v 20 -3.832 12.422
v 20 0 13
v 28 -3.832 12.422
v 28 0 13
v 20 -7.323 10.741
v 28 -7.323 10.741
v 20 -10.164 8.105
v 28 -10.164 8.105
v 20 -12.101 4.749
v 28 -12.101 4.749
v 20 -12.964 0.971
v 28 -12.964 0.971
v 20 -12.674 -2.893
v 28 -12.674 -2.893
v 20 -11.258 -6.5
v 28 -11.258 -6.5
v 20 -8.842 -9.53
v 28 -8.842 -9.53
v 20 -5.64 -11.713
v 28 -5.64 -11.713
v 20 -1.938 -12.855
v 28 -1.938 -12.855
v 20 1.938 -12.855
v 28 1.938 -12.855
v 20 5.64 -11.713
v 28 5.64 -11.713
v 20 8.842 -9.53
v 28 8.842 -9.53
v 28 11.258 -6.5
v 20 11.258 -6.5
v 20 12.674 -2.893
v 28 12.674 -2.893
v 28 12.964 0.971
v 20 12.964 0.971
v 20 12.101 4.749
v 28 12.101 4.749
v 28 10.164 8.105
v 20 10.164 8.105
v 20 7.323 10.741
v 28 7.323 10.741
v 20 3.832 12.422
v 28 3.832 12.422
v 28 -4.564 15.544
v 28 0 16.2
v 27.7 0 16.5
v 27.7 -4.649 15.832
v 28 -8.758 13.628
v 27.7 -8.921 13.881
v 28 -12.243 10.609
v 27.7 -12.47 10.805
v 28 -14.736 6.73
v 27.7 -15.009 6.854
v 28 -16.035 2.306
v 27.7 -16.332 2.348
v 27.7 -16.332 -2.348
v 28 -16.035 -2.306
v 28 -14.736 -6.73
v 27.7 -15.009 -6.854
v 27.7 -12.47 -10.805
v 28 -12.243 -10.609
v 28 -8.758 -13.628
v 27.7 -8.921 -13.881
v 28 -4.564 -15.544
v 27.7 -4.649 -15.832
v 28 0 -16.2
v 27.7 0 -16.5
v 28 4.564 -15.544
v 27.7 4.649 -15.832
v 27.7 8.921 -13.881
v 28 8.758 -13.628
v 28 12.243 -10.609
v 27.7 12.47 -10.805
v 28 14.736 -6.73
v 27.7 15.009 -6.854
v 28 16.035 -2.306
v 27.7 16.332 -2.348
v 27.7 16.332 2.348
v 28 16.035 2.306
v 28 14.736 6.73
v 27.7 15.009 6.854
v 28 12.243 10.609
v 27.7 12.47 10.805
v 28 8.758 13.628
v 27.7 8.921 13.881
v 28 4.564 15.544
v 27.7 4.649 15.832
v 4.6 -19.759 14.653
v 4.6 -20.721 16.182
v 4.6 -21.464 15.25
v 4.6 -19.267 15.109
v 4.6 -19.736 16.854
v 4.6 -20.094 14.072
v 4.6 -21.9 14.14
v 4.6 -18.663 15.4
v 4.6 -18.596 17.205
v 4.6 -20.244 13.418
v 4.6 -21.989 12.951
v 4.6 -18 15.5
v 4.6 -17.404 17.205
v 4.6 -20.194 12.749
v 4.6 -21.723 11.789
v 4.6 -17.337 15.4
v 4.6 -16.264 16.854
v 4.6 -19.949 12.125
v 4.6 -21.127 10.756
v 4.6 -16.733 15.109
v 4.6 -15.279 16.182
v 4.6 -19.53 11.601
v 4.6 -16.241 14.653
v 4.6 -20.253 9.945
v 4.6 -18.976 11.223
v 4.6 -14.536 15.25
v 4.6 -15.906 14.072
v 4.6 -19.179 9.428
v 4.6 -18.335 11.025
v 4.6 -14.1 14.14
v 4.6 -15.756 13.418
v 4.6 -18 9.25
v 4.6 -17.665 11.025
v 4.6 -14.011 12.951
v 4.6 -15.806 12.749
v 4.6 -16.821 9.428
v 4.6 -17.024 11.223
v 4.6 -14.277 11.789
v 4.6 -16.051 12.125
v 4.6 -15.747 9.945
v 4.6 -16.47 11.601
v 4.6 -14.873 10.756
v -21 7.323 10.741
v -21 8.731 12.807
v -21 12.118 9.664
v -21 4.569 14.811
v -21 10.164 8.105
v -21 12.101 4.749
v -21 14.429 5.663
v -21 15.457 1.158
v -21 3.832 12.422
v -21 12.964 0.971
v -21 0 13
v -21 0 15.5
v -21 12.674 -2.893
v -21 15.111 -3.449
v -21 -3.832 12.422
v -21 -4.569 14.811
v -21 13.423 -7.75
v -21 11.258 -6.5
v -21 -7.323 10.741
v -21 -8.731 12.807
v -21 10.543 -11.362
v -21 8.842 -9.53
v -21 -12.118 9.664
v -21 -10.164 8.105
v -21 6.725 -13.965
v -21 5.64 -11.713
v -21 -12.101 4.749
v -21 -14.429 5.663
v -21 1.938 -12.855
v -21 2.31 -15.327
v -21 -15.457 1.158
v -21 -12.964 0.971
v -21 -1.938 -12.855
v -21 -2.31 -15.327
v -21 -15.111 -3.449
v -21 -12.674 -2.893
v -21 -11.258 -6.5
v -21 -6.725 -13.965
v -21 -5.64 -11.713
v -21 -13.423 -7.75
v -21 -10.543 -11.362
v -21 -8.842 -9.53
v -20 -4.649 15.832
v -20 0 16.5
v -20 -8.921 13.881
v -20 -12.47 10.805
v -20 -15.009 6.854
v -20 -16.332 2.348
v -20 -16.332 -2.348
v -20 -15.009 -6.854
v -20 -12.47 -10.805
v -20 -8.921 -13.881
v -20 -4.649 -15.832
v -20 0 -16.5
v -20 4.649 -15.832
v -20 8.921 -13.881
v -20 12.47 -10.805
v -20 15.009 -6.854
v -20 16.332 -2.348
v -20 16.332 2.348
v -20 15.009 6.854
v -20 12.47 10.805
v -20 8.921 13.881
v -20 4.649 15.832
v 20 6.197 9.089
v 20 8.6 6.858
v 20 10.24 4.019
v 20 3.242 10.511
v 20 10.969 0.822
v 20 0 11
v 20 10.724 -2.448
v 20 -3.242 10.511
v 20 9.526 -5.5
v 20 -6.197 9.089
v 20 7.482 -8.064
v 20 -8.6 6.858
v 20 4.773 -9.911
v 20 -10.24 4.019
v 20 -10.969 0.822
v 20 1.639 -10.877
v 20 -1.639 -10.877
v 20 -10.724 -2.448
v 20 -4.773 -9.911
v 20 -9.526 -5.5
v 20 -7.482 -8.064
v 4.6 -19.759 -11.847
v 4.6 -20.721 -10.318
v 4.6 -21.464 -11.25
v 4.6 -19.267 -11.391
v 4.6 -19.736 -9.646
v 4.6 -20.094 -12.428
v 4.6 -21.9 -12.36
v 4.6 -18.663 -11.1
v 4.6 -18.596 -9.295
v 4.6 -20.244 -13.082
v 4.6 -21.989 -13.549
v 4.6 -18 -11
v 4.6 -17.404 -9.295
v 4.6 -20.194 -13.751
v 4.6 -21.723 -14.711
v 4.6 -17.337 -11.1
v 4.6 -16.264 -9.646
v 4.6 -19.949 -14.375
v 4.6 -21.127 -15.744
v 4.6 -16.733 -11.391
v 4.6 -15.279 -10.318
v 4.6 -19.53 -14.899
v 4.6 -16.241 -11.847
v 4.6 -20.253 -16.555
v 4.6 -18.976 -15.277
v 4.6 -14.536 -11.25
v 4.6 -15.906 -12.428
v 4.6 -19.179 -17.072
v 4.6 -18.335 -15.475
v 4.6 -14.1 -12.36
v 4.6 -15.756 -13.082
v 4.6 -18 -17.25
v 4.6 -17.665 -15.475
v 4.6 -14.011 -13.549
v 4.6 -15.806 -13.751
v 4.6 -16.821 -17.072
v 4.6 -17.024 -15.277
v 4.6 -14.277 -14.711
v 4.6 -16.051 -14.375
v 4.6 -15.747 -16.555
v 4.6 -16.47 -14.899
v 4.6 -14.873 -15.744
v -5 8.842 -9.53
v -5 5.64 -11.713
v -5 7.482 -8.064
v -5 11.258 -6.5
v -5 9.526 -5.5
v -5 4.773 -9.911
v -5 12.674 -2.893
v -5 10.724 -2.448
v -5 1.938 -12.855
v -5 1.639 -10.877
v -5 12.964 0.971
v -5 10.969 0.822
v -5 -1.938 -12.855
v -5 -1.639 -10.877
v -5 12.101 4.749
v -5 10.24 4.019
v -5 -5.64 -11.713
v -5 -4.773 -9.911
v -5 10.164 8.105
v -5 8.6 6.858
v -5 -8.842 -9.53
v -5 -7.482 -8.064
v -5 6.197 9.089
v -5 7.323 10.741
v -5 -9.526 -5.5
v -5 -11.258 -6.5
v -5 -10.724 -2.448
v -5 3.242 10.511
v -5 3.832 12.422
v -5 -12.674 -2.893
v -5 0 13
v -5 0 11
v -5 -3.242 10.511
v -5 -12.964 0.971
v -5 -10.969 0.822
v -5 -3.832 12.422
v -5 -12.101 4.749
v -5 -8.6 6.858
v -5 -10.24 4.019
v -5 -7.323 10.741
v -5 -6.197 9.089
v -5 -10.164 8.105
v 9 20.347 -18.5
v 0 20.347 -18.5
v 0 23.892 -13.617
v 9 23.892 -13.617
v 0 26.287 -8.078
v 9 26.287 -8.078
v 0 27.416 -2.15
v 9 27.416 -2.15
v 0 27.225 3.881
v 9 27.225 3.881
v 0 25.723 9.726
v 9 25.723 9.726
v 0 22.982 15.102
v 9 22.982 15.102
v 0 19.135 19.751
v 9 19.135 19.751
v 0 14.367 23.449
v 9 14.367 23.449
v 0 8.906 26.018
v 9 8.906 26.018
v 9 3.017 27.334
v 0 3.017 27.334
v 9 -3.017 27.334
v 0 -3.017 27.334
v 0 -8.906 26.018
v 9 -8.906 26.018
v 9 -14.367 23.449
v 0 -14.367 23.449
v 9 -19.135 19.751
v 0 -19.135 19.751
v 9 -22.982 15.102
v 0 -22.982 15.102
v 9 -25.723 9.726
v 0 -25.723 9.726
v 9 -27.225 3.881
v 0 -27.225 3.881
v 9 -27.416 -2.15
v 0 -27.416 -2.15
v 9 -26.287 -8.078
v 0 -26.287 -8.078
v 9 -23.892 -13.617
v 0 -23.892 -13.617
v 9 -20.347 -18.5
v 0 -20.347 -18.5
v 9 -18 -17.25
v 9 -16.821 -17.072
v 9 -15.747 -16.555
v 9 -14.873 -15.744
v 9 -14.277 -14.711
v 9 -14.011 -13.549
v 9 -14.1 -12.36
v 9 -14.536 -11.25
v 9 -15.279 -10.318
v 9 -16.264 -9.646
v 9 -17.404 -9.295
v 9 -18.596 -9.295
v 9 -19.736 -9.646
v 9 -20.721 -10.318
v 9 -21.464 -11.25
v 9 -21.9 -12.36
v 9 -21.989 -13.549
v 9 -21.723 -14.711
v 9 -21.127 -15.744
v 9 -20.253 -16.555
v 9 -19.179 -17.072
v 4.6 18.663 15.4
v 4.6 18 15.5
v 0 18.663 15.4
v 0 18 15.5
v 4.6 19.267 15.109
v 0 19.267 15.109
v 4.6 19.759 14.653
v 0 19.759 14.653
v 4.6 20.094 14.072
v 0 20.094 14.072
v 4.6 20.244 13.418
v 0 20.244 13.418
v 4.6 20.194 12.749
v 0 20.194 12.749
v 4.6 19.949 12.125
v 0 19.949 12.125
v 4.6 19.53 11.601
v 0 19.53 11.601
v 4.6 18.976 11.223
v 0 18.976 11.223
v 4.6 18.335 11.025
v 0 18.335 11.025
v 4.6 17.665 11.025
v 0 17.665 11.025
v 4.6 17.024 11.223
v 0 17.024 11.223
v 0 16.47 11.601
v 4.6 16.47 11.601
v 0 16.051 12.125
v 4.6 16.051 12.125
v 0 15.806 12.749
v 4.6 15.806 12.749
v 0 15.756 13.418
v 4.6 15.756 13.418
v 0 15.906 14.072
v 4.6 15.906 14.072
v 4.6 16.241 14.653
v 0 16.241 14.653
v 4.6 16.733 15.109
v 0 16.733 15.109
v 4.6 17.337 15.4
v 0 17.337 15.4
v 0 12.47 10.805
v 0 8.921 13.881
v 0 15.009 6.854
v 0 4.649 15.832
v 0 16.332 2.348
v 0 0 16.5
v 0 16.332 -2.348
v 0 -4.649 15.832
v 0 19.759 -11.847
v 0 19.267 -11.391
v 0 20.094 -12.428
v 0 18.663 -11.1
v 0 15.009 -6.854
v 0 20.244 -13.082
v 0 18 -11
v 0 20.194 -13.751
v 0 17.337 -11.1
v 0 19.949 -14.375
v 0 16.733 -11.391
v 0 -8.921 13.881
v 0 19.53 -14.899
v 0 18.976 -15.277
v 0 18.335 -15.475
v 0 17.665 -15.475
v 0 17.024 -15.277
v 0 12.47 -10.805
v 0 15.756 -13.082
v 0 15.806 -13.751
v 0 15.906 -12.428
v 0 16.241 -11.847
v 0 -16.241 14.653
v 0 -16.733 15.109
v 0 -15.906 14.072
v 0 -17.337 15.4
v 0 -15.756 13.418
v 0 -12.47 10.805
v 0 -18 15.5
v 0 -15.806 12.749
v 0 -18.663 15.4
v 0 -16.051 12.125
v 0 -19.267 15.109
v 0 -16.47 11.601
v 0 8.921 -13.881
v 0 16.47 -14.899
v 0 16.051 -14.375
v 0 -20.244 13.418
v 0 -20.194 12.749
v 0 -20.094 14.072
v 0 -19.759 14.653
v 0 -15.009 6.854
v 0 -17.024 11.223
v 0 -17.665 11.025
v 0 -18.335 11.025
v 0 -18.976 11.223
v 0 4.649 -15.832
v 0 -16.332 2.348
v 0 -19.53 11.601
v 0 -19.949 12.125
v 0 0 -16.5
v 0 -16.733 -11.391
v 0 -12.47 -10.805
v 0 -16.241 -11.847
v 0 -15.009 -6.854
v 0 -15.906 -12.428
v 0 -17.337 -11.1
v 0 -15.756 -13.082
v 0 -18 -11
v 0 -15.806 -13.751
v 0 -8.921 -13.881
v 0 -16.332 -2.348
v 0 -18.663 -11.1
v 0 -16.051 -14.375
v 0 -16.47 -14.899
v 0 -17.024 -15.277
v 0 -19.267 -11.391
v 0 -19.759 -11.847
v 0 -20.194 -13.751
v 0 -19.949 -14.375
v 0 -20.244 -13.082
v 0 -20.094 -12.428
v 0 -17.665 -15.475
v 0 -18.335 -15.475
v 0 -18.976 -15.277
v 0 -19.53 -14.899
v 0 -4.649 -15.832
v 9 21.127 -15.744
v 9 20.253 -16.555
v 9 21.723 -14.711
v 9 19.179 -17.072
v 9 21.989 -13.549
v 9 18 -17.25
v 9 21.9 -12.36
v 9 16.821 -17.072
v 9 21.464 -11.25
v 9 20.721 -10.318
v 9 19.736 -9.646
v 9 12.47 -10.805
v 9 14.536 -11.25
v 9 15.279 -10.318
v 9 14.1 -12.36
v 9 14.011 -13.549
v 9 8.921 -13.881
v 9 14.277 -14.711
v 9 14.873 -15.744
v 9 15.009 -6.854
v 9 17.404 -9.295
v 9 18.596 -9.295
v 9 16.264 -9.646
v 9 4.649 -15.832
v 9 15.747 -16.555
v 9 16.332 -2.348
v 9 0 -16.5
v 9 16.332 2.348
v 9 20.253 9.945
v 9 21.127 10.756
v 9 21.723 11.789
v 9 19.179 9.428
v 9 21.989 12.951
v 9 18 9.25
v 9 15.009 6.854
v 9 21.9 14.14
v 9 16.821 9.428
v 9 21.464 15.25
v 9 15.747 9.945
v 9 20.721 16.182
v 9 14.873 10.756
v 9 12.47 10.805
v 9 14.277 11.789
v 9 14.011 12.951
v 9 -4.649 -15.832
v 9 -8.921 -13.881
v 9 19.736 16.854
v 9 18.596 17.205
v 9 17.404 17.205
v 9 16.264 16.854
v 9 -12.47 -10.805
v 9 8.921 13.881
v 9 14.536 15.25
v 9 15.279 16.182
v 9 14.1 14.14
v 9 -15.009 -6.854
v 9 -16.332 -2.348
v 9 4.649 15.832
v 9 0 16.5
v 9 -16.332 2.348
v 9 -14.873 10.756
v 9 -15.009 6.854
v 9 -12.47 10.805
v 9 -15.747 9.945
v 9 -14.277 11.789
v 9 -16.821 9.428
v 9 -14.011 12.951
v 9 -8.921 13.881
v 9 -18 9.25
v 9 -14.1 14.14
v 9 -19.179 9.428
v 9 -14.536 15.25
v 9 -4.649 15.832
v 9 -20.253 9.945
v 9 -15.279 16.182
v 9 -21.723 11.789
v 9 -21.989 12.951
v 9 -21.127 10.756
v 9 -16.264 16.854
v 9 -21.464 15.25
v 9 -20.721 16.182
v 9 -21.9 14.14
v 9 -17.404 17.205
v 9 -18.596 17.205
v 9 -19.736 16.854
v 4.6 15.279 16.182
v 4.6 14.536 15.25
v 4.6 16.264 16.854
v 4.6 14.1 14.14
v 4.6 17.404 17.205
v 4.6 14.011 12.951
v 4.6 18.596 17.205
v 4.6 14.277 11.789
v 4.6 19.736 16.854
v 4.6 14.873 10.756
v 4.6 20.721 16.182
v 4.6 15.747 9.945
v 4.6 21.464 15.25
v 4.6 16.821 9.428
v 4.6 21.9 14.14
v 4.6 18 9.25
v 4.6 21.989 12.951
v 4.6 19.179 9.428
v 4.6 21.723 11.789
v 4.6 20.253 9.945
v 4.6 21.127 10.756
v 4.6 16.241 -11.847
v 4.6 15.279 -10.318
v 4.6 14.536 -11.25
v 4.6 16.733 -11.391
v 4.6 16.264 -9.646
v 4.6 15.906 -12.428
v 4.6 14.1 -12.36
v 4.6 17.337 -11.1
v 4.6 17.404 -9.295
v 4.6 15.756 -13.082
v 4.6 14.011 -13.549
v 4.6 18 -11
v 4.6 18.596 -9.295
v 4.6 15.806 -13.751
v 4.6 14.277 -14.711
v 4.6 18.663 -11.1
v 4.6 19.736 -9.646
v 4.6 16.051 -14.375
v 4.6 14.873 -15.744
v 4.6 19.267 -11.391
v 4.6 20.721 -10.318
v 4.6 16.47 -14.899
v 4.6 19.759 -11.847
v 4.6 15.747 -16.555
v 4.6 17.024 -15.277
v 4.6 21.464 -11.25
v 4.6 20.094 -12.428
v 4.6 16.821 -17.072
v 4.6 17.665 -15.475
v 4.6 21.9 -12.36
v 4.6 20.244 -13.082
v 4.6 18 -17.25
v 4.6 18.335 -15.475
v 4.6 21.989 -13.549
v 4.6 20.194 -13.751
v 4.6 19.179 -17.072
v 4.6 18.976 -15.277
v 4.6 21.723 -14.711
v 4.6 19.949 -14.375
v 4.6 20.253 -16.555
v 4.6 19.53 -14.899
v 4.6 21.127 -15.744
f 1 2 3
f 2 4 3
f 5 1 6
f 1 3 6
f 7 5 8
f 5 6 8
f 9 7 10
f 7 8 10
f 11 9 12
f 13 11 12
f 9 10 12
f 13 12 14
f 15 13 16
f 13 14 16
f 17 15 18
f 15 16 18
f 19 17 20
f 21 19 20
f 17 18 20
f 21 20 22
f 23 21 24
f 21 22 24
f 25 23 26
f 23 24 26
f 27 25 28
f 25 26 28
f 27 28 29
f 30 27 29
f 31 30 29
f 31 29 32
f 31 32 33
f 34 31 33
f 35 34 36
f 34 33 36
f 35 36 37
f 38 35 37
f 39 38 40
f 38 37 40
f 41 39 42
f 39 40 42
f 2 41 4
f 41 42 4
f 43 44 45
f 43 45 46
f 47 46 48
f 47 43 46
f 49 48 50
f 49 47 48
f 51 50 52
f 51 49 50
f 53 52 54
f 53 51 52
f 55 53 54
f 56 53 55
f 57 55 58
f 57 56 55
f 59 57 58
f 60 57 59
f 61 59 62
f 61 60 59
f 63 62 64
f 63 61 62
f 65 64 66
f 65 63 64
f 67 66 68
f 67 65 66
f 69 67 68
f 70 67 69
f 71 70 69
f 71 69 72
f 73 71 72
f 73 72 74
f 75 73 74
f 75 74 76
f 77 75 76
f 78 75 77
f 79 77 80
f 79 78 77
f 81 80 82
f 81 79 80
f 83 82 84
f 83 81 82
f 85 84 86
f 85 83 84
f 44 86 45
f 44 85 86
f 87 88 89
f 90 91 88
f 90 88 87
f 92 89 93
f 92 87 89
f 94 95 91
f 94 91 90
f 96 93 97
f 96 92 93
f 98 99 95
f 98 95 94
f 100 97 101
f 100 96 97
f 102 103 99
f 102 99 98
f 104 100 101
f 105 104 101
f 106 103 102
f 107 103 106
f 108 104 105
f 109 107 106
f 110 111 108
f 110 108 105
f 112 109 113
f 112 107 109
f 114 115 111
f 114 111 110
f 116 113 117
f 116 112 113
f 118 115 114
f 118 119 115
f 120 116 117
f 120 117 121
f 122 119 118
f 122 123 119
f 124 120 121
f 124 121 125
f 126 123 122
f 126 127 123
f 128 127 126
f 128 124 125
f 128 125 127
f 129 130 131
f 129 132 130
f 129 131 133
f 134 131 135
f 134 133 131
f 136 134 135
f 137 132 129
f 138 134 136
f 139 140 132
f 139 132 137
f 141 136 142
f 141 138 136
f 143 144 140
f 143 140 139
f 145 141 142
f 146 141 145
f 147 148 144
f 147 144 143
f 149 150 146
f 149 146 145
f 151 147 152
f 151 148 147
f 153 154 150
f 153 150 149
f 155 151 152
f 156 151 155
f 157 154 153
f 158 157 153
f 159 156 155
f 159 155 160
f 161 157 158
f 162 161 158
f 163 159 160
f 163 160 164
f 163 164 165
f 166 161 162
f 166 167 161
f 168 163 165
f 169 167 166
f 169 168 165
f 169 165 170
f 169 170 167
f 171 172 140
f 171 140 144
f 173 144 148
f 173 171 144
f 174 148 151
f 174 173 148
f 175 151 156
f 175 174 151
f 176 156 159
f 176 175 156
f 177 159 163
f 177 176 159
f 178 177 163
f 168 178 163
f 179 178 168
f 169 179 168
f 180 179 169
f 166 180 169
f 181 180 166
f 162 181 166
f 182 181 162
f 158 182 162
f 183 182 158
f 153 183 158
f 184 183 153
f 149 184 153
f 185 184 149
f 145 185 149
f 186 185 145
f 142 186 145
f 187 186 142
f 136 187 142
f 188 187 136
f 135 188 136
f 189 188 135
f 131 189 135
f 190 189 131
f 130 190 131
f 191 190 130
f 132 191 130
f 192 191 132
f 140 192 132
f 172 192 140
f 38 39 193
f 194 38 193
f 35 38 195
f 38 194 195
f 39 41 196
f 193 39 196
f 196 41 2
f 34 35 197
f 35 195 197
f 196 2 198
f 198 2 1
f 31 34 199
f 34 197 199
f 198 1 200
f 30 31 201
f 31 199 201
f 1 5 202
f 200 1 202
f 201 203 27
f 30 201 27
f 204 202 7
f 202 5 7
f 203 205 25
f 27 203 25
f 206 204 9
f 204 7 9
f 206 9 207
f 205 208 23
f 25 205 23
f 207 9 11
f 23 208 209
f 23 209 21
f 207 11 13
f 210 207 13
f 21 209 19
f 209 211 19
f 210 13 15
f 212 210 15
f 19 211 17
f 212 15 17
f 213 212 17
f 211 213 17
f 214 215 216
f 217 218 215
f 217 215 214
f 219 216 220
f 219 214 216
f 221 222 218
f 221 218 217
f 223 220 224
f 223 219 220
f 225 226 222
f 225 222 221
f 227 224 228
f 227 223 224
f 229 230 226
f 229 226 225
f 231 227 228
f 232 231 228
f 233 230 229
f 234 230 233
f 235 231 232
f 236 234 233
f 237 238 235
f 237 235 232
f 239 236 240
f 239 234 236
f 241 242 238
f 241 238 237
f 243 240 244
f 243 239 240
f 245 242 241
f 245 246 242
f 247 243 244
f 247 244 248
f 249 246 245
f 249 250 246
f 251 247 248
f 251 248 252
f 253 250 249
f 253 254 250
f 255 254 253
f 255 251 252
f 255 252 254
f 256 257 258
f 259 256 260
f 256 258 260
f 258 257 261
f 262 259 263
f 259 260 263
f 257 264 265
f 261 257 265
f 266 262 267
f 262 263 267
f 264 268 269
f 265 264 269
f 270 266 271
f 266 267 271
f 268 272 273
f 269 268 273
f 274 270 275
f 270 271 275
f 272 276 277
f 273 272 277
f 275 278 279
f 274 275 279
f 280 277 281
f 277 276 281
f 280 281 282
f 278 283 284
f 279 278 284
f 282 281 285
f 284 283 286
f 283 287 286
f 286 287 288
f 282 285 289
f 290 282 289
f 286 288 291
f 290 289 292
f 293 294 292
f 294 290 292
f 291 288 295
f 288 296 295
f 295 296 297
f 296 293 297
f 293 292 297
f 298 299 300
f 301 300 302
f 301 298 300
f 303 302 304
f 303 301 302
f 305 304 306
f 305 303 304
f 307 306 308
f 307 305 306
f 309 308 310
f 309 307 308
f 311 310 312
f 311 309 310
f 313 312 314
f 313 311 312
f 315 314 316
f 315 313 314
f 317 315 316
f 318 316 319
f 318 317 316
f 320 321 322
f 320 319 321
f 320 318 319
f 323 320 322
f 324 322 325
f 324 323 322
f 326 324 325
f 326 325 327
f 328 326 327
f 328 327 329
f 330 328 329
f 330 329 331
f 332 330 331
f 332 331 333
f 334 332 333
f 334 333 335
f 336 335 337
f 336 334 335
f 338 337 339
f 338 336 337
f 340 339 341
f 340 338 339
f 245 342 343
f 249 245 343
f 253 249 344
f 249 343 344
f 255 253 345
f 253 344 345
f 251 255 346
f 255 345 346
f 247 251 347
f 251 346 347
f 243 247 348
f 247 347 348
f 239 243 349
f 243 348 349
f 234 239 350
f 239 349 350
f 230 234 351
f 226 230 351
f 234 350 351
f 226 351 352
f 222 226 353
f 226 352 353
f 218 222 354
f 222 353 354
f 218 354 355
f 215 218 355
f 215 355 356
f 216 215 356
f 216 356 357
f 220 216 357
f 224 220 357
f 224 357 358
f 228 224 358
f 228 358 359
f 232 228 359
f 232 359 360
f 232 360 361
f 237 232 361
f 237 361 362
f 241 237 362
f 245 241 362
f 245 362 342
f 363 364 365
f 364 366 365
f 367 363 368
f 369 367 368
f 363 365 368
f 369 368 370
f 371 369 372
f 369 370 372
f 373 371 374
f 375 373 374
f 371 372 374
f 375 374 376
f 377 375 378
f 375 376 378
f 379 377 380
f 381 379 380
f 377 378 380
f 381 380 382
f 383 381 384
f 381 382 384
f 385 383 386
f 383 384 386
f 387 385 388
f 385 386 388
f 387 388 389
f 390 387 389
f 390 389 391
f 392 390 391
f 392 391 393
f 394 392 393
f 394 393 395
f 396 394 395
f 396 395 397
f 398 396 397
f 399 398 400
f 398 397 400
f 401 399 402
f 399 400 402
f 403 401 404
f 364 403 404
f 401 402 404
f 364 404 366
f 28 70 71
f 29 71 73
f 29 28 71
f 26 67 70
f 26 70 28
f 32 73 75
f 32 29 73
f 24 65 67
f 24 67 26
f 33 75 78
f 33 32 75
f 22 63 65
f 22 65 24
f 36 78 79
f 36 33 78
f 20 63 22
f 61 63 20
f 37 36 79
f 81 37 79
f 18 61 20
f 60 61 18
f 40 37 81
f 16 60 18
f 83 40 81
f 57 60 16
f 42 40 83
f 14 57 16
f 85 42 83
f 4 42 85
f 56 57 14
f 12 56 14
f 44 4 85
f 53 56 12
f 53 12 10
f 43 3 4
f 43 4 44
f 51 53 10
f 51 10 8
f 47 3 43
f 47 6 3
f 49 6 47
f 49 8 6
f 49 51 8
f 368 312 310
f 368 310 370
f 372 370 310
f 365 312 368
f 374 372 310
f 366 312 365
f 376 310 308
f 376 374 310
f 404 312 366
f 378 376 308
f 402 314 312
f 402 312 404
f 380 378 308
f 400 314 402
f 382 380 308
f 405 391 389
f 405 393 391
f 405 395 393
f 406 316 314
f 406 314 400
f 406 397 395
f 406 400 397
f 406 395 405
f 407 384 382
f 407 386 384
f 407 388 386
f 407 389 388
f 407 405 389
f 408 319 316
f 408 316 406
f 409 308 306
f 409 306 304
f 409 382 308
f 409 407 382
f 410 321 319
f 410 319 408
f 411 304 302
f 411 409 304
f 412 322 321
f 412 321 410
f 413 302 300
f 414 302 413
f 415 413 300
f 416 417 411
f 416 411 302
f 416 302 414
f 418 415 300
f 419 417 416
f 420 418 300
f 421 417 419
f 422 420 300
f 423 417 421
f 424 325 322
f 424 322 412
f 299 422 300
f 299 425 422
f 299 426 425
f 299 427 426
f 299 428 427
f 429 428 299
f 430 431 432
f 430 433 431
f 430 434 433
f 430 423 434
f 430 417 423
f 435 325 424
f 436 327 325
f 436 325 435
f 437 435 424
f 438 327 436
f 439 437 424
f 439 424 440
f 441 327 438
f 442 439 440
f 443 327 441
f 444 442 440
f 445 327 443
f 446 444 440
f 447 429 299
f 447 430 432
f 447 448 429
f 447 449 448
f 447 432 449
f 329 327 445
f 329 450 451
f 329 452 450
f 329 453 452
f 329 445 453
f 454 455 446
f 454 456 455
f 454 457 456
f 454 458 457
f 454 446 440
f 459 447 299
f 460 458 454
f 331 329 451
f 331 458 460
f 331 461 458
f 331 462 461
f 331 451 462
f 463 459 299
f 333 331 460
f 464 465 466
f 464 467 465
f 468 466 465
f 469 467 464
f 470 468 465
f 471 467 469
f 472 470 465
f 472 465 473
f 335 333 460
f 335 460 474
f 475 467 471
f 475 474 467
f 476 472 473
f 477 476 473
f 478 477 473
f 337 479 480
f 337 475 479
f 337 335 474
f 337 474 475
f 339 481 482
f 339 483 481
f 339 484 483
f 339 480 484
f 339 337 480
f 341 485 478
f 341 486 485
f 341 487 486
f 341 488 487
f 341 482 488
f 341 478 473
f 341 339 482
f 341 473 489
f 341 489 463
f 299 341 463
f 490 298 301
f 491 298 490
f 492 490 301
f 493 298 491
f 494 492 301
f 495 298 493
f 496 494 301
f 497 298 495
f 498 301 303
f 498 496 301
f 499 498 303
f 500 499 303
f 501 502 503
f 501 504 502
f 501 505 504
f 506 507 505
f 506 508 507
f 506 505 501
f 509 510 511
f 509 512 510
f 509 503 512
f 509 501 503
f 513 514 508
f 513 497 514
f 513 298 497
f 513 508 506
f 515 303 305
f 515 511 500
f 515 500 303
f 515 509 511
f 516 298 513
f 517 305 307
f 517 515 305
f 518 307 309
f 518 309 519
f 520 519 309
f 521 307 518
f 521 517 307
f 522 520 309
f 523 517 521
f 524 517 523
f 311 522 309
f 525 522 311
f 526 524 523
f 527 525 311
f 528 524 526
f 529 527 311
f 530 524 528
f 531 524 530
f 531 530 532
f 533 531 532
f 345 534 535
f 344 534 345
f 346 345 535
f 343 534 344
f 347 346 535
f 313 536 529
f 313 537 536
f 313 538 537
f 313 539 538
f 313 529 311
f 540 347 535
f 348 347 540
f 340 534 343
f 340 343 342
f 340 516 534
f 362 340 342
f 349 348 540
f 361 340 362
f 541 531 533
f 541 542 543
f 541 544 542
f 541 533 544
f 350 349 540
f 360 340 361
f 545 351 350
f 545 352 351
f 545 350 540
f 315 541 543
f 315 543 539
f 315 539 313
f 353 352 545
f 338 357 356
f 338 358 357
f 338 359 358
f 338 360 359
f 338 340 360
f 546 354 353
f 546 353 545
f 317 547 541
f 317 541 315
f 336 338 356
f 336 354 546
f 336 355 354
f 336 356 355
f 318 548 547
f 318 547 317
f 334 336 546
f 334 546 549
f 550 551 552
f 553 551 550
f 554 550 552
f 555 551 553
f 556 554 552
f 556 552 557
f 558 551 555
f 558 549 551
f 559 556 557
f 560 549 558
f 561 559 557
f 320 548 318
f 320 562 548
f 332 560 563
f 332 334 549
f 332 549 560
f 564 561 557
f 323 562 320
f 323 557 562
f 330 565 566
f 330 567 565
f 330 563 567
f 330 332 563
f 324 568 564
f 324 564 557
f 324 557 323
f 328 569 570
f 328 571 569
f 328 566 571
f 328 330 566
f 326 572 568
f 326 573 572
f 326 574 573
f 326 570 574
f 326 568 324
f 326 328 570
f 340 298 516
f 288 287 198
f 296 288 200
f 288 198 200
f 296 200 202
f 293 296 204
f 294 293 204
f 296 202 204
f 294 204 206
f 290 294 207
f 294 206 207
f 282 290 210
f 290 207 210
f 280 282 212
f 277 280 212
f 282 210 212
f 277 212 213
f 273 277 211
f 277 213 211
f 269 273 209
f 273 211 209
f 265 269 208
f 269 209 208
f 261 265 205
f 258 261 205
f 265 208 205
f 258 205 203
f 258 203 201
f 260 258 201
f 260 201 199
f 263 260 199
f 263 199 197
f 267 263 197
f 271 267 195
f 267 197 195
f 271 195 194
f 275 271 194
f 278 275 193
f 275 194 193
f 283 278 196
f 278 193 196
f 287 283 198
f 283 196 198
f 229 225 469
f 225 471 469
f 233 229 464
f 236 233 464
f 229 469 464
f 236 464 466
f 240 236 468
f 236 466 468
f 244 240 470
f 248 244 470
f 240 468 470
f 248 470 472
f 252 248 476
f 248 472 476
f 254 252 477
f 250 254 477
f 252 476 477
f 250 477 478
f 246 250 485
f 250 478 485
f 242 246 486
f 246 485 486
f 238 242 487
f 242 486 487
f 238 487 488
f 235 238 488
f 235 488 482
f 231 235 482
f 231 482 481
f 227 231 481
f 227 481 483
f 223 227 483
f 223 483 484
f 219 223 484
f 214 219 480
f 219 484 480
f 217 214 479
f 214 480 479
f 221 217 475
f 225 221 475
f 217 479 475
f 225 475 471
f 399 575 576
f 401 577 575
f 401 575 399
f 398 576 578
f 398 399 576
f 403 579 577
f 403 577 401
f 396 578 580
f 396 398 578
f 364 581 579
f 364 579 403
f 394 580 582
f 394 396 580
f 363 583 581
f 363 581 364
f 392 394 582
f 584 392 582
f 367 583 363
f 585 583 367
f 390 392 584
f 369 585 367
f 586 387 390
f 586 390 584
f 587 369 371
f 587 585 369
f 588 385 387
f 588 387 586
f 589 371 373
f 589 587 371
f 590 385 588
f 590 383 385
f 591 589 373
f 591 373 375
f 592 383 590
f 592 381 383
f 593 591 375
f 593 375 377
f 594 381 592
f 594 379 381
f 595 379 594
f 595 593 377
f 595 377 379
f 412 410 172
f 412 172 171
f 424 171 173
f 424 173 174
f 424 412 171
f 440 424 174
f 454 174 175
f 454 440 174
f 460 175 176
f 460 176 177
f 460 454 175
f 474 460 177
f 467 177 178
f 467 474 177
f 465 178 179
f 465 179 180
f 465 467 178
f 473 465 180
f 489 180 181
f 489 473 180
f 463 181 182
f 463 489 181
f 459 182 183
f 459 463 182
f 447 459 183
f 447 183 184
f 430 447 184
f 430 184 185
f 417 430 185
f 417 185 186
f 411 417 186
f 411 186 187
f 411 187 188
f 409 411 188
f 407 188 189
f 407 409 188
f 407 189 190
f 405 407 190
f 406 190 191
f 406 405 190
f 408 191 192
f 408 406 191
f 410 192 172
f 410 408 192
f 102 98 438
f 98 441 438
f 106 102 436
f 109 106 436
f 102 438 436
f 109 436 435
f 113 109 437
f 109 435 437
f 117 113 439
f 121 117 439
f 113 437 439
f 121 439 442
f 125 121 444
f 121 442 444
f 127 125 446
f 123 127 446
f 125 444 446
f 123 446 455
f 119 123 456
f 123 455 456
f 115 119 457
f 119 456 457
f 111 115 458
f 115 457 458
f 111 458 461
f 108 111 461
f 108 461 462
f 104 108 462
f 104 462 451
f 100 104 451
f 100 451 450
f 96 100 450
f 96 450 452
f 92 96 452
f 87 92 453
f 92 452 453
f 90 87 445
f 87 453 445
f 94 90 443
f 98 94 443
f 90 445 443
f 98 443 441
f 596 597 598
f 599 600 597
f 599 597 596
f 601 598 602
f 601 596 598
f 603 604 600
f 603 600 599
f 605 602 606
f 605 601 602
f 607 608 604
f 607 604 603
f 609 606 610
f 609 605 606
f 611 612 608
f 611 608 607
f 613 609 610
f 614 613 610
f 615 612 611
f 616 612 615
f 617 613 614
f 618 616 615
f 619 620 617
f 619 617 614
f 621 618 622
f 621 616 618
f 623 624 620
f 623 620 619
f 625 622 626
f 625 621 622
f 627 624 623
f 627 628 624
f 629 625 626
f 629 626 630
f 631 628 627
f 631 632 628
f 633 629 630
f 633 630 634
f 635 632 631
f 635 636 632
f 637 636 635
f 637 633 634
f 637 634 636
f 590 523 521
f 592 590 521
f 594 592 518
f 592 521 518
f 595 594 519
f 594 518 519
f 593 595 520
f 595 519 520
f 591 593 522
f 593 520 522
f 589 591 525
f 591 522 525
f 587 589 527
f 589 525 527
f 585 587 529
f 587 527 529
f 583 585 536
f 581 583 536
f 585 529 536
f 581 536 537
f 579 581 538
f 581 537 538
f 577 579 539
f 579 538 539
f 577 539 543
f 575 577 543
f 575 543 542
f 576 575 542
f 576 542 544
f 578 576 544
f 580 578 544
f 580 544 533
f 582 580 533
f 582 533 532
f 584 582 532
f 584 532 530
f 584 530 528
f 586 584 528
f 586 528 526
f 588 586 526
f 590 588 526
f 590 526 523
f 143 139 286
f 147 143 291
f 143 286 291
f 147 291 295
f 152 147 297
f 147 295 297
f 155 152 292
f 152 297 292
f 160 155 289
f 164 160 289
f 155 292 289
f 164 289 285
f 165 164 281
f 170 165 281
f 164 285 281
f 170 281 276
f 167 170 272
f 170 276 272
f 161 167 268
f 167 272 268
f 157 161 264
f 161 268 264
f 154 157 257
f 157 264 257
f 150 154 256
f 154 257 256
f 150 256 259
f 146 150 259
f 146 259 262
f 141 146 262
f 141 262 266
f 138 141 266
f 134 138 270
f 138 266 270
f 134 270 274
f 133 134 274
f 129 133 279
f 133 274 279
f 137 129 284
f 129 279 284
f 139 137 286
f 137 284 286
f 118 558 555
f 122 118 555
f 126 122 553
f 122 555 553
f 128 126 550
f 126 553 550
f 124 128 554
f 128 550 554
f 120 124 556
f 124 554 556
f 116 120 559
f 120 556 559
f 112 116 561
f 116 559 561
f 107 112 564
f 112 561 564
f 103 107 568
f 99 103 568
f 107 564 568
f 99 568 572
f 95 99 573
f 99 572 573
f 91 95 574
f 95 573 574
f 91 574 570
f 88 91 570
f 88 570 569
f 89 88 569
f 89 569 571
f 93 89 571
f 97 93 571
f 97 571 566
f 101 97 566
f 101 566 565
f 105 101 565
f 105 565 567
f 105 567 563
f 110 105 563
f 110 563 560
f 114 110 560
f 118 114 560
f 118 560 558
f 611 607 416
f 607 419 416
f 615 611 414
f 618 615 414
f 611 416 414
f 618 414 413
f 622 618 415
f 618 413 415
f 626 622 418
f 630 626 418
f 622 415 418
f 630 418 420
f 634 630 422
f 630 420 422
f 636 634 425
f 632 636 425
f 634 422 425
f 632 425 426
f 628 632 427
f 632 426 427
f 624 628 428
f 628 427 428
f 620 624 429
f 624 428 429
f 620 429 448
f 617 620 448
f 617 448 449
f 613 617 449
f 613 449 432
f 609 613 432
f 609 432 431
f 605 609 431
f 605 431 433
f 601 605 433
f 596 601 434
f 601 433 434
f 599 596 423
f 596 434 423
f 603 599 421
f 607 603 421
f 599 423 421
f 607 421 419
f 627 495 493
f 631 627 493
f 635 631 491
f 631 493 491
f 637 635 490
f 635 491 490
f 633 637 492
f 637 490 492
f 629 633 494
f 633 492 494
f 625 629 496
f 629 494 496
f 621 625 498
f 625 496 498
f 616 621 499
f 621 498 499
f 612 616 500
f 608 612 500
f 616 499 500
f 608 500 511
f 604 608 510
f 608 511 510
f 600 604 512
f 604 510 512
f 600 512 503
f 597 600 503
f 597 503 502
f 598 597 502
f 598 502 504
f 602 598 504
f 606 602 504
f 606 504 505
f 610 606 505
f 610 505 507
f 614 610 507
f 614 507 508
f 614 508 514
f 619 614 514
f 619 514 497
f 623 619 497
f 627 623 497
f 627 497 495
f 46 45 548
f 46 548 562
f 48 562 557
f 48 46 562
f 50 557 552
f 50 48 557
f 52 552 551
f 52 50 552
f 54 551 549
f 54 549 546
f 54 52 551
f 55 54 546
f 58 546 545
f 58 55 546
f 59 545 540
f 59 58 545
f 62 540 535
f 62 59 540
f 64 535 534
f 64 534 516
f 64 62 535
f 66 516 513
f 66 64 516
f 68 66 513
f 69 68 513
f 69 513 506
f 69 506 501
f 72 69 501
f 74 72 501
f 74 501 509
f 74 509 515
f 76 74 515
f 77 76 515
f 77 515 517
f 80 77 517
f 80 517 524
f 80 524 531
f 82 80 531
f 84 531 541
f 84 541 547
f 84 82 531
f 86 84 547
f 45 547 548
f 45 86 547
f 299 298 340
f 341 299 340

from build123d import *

# Parameters (mm, degrees)
CUT_EXTRUDE1_REACH                              = 51.117
CBORE_FOR_M4_SOCKET_HEAD_CAP_SCREW1_D           = 4.5
CBORE_FOR_M4_SOCKET_HEAD_CAP_SCREW1_CBORE_D     = 8
CBORE_FOR_M4_SOCKET_HEAD_CAP_SCREW1_CBORE_DEPTH = 4.4
CHAMFER1_SIZE                                   = 1
CHAMFER2_SIZE                                   = 0.3


with BuildPart() as part:
    # Sketch1 → Revolve1 (revolve)
    with BuildSketch(Plane.XY, mode=Mode.PRIVATE) as revolve1_sk:
        Polygon((-21, 0), (-21, 16.5), (0, 16.5), (0, 27.5), (9, 27.5), (9, 16.5), (28, 16.5), (28, 0), align=None)
    revolve(revolve1_sk.sketch.rotate(Axis((-30.202765387, 0, 0), (1, 0, 0)), 90), axis=Axis((-30.202765387, 0, 0), (1, 0, 0)))

    # Sketch2 → Cut-Revolve1 (revolve, cut)
    with BuildSketch(Plane.XY, mode=Mode.PRIVATE) as cut_revolve1_sk:
        Polygon((-21, 0), (-21, 13), (-5, 13), (-5, 11), (20, 11), (20, 13), (28, 13), (28, 0), align=None)
    revolve(cut_revolve1_sk.sketch.rotate(Axis((-25.491403617, 0, 0), (1, 0, 0)), 90), axis=Axis((-25.491403617, 0, 0), (1, 0, 0)), mode=Mode.SUBTRACT)

    # Sketch5 → Cut-Extrude1 (cut, up to next)
    with BuildSketch(Plane(origin=(9, 0, 0), x_dir=(0, 0, -1), z_dir=(1, 0, 0)), mode=Mode.PRIVATE) as cut_extrude1_sk1:
        with BuildLine():
            Line((18.5, 20.346989949), (18.5, -20.346989949))
            ThreePointArc((18.5, -20.346989949), (27.5, 0), (18.5, 20.346989949))
        make_face()
    cut_extrude1_tool1 = extrude(cut_extrude1_sk1.sketch, amount=-CUT_EXTRUDE1_REACH, mode=Mode.PRIVATE) & part.part
    add(cut_extrude1_tool1.solids().sort_by_distance((9, 0, -22.155812))[0], mode=Mode.SUBTRACT)

    # CBORE for M4 Socket Head Cap Screw1 (through all)
    with Locations(Plane(origin=(9, 0, 0), x_dir=(0, 0, -1), z_dir=(1, 0, 0))):
        with Locations((-13.25, 18), (13.25, 18), (13.25, -18), (-13.25, -18)):
            CounterBoreHole(CBORE_FOR_M4_SOCKET_HEAD_CAP_SCREW1_D / 2, CBORE_FOR_M4_SOCKET_HEAD_CAP_SCREW1_CBORE_D / 2, CBORE_FOR_M4_SOCKET_HEAD_CAP_SCREW1_CBORE_DEPTH)

    # Chamfer1
    chamfer1_edges = [part.edges().sort_by_distance(p)[0] for p in [
        (-21, 0, -16.5),
    ]]
    chamfer(chamfer1_edges, length=CHAMFER1_SIZE)

    # Chamfer2
    chamfer2_edges = [part.edges().sort_by_distance(p)[0] for p in [
        (28, 0, -16.5),
    ]]
    chamfer(chamfer2_edges, length=CHAMFER2_SIZE)


solid = part.part
